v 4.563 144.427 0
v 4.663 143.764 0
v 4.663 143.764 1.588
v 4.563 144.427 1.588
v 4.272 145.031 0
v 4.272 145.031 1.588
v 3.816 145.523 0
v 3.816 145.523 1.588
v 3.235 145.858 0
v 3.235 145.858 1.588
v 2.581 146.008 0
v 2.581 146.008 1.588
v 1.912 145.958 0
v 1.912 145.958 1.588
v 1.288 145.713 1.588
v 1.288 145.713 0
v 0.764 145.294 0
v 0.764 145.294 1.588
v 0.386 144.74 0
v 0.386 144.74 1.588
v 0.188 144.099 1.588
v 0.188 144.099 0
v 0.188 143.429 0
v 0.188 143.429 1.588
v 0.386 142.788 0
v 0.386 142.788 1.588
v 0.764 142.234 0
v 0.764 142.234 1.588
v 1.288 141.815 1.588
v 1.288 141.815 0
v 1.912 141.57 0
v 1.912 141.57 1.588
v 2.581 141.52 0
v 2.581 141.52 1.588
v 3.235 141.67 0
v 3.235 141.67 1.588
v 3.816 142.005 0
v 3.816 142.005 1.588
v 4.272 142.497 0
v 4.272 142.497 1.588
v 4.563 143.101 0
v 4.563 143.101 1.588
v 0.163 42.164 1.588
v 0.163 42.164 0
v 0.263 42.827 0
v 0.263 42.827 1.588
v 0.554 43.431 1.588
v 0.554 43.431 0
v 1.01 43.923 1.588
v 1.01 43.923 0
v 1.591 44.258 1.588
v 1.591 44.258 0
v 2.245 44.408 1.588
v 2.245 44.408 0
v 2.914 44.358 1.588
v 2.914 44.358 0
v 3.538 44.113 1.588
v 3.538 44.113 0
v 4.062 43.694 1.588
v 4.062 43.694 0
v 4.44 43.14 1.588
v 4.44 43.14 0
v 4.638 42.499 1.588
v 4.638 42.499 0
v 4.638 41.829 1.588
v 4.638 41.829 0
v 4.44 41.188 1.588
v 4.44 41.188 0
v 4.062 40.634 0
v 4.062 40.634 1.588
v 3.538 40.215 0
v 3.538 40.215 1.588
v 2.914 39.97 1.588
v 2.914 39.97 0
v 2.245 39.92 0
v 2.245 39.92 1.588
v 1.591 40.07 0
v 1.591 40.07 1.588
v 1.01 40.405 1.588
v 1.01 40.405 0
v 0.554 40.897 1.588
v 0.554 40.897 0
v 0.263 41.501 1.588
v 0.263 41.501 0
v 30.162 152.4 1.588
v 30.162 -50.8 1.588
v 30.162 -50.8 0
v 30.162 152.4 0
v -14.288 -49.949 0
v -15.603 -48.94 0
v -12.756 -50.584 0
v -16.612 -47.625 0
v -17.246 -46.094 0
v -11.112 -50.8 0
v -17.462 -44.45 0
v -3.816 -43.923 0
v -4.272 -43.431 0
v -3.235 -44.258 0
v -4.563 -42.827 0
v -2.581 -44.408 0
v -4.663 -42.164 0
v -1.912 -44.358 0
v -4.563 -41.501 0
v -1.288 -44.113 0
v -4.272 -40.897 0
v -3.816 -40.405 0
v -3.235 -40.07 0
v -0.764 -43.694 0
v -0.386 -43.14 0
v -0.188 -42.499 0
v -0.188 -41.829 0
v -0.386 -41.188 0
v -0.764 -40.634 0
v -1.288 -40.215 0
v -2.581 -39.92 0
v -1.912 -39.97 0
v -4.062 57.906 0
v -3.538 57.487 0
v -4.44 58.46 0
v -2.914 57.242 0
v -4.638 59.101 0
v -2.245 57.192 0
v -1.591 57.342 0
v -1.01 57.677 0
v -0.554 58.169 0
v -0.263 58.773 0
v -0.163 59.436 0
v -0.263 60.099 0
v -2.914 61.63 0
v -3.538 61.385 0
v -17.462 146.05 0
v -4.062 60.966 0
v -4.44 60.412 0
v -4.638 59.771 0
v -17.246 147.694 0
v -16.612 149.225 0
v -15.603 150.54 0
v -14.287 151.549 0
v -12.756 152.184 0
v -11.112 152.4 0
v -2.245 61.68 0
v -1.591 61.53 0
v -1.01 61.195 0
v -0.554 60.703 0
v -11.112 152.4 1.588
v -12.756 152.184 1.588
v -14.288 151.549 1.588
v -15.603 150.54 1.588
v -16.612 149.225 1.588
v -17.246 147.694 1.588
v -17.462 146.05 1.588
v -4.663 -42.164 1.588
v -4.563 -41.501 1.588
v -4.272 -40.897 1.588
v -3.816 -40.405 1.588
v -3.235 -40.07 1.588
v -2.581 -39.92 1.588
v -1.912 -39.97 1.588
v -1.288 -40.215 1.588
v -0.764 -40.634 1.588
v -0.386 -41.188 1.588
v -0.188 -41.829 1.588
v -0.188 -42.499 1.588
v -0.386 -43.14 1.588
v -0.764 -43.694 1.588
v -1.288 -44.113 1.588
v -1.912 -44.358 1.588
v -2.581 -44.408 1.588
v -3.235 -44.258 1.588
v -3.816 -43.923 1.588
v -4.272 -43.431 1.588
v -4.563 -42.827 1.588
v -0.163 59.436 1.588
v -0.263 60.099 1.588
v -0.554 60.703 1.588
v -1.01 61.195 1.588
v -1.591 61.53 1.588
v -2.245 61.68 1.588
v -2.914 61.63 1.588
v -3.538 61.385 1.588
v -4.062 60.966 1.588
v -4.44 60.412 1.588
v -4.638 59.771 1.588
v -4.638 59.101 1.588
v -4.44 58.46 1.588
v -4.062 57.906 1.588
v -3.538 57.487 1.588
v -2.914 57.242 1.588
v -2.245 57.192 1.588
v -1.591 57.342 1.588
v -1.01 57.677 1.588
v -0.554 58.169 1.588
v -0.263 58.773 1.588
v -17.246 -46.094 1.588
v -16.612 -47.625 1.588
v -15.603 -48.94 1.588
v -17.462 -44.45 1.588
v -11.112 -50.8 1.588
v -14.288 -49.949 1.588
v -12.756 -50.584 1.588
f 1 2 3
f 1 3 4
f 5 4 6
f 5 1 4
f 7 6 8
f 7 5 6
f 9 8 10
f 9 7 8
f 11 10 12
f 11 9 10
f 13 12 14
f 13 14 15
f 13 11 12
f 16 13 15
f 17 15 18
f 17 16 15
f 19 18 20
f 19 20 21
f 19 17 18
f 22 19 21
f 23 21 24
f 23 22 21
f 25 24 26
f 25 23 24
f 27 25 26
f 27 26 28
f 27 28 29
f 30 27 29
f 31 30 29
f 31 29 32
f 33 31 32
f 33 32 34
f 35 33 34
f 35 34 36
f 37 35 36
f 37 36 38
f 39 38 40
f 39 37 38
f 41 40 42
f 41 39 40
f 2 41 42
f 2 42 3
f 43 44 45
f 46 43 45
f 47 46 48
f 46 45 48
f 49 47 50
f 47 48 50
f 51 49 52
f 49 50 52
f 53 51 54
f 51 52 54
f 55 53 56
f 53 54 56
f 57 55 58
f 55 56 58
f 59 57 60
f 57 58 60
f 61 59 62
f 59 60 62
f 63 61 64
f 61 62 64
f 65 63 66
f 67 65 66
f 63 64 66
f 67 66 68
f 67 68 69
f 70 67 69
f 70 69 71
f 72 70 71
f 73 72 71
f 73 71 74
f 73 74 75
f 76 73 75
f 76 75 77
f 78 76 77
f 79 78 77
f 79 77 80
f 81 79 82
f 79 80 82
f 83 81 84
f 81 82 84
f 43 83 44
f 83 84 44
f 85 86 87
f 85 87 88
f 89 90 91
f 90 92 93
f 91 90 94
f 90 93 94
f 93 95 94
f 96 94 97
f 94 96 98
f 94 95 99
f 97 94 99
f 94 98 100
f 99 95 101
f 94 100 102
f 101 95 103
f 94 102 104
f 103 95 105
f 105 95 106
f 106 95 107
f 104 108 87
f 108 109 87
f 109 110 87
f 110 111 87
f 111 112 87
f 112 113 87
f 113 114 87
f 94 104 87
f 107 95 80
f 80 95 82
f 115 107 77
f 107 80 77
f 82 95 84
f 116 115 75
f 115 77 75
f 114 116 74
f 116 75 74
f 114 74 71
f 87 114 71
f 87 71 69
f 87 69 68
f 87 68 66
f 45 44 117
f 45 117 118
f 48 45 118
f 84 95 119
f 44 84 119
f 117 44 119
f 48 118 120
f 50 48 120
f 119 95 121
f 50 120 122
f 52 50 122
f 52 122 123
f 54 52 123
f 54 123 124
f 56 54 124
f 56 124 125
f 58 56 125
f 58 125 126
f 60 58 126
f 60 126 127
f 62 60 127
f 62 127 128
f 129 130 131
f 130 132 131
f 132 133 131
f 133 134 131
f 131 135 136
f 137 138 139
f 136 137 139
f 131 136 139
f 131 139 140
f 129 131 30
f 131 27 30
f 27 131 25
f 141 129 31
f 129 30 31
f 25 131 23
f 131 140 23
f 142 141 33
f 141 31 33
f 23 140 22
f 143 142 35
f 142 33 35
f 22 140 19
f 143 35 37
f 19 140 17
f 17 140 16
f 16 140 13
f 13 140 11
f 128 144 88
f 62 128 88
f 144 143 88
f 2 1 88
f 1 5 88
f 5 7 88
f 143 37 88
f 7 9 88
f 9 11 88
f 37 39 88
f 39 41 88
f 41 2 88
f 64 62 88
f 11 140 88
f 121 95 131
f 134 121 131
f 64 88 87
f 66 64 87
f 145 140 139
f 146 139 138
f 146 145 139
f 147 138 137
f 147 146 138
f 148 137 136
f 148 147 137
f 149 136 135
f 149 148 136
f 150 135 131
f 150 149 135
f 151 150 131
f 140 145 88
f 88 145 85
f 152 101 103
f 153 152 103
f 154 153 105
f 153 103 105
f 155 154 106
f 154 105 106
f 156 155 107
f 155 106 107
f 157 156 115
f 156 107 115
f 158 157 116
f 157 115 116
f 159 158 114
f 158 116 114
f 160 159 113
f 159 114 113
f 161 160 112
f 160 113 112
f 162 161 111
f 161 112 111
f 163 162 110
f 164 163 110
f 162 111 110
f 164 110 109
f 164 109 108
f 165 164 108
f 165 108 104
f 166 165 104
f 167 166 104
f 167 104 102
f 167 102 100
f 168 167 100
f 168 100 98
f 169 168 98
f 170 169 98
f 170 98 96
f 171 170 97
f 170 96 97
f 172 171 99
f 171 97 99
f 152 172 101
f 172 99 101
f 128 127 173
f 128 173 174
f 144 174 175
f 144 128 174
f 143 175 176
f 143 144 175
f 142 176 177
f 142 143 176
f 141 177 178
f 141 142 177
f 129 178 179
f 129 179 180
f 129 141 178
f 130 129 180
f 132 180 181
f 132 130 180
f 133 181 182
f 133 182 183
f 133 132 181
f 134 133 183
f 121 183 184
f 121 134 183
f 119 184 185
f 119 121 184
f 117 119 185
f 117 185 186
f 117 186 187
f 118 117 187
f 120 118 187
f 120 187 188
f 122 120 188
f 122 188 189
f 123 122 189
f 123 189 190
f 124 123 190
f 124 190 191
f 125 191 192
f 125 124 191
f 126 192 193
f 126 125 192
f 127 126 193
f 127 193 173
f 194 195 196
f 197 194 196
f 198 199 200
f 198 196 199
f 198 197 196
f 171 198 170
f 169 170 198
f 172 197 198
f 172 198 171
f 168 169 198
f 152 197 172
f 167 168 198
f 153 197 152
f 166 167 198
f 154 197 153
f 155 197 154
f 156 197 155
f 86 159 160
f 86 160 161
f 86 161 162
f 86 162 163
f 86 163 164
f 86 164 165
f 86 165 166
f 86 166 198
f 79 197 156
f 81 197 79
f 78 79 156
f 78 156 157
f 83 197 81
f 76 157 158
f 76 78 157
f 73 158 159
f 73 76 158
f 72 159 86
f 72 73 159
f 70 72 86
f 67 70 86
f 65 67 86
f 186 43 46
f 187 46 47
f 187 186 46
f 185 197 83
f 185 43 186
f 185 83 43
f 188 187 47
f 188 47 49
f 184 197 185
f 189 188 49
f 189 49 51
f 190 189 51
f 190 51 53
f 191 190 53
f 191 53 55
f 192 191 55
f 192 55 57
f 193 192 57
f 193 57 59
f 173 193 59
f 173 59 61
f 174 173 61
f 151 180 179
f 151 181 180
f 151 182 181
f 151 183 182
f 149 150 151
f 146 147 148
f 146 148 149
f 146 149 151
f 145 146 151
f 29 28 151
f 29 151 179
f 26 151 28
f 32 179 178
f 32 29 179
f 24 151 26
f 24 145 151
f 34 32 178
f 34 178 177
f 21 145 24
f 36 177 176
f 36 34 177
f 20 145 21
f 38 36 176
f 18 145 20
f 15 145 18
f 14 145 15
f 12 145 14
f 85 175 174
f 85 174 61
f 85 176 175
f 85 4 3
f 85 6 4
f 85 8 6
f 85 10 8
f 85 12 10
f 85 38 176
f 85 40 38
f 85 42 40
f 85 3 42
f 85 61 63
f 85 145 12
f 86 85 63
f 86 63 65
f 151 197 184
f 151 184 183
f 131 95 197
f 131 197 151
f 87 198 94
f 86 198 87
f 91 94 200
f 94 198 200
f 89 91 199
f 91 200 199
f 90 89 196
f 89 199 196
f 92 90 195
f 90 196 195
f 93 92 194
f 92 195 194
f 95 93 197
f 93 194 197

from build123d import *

# Parameters (mm, degrees)
SKETCH1_W            = 34.925
SKETCH1_H            = 101.6
BOSS_EXTRUDE1_DEPTH  = 1.5875
M4_CLEARANCE_HOLE1_D = 4.5
BOSS_EXTRUDE4_START  = -1.5875
SKETCH8_W            = 34.925
SKETCH8_H            = 101.6
SKETCH8_R            = 2.25
BOSS_EXTRUDE4_DEPTH  = 1.5875
SKETCH9_W            = 12.7
SKETCH9_H            = 203.2
BOSS_EXTRUDE5_DEPTH  = 1.5875
FILLET1_R            = 6.35


with BuildPart() as part:
    # Sketch1 → Boss-Extrude1 (new body)
    with BuildSketch(Plane.XY):
        Rectangle(SKETCH1_W, SKETCH1_H)
    extrude(amount=BOSS_EXTRUDE1_DEPTH)

    # M4 Clearance Hole1 (through all)
    with Locations(Plane.XY.offset(1.5875)):
        with Locations((-2.413, -42.164), (2.413, 42.164)):
            Hole(M4_CLEARANCE_HOLE1_D / 2)

    # Sketch8 → Boss-Extrude4 (add)
    # profile 1 of 2: a face of its own
    with BuildSketch(Plane.XY.offset(1.5875).offset(BOSS_EXTRUDE4_START)):
        with Locations((0, 101.6)):
            Rectangle(SKETCH8_W, SKETCH8_H)
        with Locations((-2.413, 59.436)):
            Circle(SKETCH8_R, mode=Mode.SUBTRACT)
        with Locations((2.413, 143.764)):
            Circle(SKETCH8_R, mode=Mode.SUBTRACT)
    # profile 2 of 2: a face of its own
    with BuildSketch(Plane.XY.offset(1.5875).offset(BOSS_EXTRUDE4_START)):
        Rectangle(SKETCH8_W, SKETCH8_H)
        with Locations((-2.413, -42.164)):
            Circle(SKETCH8_R, mode=Mode.SUBTRACT)
        with Locations((2.413, 42.164)):
            Circle(SKETCH8_R, mode=Mode.SUBTRACT)
    extrude(amount=BOSS_EXTRUDE4_DEPTH)

    # Sketch9 → Boss-Extrude5 (add)
    with BuildSketch(Plane.XY.offset(1.5875)):
        with Locations((23.8125, 50.8)):
            Rectangle(SKETCH9_W, SKETCH9_H)
    extrude(amount=-BOSS_EXTRUDE5_DEPTH)

    # Fillet1
    fillet1_edges = [part.edges().sort_by_distance(p)[0] for p in [
        (-17.4625, 152.4, 0.79375),
        (-17.4625, -50.8, 0.79375),
    ]]
    fillet(fillet1_edges, radius=FILLET1_R)


solid = part.part
